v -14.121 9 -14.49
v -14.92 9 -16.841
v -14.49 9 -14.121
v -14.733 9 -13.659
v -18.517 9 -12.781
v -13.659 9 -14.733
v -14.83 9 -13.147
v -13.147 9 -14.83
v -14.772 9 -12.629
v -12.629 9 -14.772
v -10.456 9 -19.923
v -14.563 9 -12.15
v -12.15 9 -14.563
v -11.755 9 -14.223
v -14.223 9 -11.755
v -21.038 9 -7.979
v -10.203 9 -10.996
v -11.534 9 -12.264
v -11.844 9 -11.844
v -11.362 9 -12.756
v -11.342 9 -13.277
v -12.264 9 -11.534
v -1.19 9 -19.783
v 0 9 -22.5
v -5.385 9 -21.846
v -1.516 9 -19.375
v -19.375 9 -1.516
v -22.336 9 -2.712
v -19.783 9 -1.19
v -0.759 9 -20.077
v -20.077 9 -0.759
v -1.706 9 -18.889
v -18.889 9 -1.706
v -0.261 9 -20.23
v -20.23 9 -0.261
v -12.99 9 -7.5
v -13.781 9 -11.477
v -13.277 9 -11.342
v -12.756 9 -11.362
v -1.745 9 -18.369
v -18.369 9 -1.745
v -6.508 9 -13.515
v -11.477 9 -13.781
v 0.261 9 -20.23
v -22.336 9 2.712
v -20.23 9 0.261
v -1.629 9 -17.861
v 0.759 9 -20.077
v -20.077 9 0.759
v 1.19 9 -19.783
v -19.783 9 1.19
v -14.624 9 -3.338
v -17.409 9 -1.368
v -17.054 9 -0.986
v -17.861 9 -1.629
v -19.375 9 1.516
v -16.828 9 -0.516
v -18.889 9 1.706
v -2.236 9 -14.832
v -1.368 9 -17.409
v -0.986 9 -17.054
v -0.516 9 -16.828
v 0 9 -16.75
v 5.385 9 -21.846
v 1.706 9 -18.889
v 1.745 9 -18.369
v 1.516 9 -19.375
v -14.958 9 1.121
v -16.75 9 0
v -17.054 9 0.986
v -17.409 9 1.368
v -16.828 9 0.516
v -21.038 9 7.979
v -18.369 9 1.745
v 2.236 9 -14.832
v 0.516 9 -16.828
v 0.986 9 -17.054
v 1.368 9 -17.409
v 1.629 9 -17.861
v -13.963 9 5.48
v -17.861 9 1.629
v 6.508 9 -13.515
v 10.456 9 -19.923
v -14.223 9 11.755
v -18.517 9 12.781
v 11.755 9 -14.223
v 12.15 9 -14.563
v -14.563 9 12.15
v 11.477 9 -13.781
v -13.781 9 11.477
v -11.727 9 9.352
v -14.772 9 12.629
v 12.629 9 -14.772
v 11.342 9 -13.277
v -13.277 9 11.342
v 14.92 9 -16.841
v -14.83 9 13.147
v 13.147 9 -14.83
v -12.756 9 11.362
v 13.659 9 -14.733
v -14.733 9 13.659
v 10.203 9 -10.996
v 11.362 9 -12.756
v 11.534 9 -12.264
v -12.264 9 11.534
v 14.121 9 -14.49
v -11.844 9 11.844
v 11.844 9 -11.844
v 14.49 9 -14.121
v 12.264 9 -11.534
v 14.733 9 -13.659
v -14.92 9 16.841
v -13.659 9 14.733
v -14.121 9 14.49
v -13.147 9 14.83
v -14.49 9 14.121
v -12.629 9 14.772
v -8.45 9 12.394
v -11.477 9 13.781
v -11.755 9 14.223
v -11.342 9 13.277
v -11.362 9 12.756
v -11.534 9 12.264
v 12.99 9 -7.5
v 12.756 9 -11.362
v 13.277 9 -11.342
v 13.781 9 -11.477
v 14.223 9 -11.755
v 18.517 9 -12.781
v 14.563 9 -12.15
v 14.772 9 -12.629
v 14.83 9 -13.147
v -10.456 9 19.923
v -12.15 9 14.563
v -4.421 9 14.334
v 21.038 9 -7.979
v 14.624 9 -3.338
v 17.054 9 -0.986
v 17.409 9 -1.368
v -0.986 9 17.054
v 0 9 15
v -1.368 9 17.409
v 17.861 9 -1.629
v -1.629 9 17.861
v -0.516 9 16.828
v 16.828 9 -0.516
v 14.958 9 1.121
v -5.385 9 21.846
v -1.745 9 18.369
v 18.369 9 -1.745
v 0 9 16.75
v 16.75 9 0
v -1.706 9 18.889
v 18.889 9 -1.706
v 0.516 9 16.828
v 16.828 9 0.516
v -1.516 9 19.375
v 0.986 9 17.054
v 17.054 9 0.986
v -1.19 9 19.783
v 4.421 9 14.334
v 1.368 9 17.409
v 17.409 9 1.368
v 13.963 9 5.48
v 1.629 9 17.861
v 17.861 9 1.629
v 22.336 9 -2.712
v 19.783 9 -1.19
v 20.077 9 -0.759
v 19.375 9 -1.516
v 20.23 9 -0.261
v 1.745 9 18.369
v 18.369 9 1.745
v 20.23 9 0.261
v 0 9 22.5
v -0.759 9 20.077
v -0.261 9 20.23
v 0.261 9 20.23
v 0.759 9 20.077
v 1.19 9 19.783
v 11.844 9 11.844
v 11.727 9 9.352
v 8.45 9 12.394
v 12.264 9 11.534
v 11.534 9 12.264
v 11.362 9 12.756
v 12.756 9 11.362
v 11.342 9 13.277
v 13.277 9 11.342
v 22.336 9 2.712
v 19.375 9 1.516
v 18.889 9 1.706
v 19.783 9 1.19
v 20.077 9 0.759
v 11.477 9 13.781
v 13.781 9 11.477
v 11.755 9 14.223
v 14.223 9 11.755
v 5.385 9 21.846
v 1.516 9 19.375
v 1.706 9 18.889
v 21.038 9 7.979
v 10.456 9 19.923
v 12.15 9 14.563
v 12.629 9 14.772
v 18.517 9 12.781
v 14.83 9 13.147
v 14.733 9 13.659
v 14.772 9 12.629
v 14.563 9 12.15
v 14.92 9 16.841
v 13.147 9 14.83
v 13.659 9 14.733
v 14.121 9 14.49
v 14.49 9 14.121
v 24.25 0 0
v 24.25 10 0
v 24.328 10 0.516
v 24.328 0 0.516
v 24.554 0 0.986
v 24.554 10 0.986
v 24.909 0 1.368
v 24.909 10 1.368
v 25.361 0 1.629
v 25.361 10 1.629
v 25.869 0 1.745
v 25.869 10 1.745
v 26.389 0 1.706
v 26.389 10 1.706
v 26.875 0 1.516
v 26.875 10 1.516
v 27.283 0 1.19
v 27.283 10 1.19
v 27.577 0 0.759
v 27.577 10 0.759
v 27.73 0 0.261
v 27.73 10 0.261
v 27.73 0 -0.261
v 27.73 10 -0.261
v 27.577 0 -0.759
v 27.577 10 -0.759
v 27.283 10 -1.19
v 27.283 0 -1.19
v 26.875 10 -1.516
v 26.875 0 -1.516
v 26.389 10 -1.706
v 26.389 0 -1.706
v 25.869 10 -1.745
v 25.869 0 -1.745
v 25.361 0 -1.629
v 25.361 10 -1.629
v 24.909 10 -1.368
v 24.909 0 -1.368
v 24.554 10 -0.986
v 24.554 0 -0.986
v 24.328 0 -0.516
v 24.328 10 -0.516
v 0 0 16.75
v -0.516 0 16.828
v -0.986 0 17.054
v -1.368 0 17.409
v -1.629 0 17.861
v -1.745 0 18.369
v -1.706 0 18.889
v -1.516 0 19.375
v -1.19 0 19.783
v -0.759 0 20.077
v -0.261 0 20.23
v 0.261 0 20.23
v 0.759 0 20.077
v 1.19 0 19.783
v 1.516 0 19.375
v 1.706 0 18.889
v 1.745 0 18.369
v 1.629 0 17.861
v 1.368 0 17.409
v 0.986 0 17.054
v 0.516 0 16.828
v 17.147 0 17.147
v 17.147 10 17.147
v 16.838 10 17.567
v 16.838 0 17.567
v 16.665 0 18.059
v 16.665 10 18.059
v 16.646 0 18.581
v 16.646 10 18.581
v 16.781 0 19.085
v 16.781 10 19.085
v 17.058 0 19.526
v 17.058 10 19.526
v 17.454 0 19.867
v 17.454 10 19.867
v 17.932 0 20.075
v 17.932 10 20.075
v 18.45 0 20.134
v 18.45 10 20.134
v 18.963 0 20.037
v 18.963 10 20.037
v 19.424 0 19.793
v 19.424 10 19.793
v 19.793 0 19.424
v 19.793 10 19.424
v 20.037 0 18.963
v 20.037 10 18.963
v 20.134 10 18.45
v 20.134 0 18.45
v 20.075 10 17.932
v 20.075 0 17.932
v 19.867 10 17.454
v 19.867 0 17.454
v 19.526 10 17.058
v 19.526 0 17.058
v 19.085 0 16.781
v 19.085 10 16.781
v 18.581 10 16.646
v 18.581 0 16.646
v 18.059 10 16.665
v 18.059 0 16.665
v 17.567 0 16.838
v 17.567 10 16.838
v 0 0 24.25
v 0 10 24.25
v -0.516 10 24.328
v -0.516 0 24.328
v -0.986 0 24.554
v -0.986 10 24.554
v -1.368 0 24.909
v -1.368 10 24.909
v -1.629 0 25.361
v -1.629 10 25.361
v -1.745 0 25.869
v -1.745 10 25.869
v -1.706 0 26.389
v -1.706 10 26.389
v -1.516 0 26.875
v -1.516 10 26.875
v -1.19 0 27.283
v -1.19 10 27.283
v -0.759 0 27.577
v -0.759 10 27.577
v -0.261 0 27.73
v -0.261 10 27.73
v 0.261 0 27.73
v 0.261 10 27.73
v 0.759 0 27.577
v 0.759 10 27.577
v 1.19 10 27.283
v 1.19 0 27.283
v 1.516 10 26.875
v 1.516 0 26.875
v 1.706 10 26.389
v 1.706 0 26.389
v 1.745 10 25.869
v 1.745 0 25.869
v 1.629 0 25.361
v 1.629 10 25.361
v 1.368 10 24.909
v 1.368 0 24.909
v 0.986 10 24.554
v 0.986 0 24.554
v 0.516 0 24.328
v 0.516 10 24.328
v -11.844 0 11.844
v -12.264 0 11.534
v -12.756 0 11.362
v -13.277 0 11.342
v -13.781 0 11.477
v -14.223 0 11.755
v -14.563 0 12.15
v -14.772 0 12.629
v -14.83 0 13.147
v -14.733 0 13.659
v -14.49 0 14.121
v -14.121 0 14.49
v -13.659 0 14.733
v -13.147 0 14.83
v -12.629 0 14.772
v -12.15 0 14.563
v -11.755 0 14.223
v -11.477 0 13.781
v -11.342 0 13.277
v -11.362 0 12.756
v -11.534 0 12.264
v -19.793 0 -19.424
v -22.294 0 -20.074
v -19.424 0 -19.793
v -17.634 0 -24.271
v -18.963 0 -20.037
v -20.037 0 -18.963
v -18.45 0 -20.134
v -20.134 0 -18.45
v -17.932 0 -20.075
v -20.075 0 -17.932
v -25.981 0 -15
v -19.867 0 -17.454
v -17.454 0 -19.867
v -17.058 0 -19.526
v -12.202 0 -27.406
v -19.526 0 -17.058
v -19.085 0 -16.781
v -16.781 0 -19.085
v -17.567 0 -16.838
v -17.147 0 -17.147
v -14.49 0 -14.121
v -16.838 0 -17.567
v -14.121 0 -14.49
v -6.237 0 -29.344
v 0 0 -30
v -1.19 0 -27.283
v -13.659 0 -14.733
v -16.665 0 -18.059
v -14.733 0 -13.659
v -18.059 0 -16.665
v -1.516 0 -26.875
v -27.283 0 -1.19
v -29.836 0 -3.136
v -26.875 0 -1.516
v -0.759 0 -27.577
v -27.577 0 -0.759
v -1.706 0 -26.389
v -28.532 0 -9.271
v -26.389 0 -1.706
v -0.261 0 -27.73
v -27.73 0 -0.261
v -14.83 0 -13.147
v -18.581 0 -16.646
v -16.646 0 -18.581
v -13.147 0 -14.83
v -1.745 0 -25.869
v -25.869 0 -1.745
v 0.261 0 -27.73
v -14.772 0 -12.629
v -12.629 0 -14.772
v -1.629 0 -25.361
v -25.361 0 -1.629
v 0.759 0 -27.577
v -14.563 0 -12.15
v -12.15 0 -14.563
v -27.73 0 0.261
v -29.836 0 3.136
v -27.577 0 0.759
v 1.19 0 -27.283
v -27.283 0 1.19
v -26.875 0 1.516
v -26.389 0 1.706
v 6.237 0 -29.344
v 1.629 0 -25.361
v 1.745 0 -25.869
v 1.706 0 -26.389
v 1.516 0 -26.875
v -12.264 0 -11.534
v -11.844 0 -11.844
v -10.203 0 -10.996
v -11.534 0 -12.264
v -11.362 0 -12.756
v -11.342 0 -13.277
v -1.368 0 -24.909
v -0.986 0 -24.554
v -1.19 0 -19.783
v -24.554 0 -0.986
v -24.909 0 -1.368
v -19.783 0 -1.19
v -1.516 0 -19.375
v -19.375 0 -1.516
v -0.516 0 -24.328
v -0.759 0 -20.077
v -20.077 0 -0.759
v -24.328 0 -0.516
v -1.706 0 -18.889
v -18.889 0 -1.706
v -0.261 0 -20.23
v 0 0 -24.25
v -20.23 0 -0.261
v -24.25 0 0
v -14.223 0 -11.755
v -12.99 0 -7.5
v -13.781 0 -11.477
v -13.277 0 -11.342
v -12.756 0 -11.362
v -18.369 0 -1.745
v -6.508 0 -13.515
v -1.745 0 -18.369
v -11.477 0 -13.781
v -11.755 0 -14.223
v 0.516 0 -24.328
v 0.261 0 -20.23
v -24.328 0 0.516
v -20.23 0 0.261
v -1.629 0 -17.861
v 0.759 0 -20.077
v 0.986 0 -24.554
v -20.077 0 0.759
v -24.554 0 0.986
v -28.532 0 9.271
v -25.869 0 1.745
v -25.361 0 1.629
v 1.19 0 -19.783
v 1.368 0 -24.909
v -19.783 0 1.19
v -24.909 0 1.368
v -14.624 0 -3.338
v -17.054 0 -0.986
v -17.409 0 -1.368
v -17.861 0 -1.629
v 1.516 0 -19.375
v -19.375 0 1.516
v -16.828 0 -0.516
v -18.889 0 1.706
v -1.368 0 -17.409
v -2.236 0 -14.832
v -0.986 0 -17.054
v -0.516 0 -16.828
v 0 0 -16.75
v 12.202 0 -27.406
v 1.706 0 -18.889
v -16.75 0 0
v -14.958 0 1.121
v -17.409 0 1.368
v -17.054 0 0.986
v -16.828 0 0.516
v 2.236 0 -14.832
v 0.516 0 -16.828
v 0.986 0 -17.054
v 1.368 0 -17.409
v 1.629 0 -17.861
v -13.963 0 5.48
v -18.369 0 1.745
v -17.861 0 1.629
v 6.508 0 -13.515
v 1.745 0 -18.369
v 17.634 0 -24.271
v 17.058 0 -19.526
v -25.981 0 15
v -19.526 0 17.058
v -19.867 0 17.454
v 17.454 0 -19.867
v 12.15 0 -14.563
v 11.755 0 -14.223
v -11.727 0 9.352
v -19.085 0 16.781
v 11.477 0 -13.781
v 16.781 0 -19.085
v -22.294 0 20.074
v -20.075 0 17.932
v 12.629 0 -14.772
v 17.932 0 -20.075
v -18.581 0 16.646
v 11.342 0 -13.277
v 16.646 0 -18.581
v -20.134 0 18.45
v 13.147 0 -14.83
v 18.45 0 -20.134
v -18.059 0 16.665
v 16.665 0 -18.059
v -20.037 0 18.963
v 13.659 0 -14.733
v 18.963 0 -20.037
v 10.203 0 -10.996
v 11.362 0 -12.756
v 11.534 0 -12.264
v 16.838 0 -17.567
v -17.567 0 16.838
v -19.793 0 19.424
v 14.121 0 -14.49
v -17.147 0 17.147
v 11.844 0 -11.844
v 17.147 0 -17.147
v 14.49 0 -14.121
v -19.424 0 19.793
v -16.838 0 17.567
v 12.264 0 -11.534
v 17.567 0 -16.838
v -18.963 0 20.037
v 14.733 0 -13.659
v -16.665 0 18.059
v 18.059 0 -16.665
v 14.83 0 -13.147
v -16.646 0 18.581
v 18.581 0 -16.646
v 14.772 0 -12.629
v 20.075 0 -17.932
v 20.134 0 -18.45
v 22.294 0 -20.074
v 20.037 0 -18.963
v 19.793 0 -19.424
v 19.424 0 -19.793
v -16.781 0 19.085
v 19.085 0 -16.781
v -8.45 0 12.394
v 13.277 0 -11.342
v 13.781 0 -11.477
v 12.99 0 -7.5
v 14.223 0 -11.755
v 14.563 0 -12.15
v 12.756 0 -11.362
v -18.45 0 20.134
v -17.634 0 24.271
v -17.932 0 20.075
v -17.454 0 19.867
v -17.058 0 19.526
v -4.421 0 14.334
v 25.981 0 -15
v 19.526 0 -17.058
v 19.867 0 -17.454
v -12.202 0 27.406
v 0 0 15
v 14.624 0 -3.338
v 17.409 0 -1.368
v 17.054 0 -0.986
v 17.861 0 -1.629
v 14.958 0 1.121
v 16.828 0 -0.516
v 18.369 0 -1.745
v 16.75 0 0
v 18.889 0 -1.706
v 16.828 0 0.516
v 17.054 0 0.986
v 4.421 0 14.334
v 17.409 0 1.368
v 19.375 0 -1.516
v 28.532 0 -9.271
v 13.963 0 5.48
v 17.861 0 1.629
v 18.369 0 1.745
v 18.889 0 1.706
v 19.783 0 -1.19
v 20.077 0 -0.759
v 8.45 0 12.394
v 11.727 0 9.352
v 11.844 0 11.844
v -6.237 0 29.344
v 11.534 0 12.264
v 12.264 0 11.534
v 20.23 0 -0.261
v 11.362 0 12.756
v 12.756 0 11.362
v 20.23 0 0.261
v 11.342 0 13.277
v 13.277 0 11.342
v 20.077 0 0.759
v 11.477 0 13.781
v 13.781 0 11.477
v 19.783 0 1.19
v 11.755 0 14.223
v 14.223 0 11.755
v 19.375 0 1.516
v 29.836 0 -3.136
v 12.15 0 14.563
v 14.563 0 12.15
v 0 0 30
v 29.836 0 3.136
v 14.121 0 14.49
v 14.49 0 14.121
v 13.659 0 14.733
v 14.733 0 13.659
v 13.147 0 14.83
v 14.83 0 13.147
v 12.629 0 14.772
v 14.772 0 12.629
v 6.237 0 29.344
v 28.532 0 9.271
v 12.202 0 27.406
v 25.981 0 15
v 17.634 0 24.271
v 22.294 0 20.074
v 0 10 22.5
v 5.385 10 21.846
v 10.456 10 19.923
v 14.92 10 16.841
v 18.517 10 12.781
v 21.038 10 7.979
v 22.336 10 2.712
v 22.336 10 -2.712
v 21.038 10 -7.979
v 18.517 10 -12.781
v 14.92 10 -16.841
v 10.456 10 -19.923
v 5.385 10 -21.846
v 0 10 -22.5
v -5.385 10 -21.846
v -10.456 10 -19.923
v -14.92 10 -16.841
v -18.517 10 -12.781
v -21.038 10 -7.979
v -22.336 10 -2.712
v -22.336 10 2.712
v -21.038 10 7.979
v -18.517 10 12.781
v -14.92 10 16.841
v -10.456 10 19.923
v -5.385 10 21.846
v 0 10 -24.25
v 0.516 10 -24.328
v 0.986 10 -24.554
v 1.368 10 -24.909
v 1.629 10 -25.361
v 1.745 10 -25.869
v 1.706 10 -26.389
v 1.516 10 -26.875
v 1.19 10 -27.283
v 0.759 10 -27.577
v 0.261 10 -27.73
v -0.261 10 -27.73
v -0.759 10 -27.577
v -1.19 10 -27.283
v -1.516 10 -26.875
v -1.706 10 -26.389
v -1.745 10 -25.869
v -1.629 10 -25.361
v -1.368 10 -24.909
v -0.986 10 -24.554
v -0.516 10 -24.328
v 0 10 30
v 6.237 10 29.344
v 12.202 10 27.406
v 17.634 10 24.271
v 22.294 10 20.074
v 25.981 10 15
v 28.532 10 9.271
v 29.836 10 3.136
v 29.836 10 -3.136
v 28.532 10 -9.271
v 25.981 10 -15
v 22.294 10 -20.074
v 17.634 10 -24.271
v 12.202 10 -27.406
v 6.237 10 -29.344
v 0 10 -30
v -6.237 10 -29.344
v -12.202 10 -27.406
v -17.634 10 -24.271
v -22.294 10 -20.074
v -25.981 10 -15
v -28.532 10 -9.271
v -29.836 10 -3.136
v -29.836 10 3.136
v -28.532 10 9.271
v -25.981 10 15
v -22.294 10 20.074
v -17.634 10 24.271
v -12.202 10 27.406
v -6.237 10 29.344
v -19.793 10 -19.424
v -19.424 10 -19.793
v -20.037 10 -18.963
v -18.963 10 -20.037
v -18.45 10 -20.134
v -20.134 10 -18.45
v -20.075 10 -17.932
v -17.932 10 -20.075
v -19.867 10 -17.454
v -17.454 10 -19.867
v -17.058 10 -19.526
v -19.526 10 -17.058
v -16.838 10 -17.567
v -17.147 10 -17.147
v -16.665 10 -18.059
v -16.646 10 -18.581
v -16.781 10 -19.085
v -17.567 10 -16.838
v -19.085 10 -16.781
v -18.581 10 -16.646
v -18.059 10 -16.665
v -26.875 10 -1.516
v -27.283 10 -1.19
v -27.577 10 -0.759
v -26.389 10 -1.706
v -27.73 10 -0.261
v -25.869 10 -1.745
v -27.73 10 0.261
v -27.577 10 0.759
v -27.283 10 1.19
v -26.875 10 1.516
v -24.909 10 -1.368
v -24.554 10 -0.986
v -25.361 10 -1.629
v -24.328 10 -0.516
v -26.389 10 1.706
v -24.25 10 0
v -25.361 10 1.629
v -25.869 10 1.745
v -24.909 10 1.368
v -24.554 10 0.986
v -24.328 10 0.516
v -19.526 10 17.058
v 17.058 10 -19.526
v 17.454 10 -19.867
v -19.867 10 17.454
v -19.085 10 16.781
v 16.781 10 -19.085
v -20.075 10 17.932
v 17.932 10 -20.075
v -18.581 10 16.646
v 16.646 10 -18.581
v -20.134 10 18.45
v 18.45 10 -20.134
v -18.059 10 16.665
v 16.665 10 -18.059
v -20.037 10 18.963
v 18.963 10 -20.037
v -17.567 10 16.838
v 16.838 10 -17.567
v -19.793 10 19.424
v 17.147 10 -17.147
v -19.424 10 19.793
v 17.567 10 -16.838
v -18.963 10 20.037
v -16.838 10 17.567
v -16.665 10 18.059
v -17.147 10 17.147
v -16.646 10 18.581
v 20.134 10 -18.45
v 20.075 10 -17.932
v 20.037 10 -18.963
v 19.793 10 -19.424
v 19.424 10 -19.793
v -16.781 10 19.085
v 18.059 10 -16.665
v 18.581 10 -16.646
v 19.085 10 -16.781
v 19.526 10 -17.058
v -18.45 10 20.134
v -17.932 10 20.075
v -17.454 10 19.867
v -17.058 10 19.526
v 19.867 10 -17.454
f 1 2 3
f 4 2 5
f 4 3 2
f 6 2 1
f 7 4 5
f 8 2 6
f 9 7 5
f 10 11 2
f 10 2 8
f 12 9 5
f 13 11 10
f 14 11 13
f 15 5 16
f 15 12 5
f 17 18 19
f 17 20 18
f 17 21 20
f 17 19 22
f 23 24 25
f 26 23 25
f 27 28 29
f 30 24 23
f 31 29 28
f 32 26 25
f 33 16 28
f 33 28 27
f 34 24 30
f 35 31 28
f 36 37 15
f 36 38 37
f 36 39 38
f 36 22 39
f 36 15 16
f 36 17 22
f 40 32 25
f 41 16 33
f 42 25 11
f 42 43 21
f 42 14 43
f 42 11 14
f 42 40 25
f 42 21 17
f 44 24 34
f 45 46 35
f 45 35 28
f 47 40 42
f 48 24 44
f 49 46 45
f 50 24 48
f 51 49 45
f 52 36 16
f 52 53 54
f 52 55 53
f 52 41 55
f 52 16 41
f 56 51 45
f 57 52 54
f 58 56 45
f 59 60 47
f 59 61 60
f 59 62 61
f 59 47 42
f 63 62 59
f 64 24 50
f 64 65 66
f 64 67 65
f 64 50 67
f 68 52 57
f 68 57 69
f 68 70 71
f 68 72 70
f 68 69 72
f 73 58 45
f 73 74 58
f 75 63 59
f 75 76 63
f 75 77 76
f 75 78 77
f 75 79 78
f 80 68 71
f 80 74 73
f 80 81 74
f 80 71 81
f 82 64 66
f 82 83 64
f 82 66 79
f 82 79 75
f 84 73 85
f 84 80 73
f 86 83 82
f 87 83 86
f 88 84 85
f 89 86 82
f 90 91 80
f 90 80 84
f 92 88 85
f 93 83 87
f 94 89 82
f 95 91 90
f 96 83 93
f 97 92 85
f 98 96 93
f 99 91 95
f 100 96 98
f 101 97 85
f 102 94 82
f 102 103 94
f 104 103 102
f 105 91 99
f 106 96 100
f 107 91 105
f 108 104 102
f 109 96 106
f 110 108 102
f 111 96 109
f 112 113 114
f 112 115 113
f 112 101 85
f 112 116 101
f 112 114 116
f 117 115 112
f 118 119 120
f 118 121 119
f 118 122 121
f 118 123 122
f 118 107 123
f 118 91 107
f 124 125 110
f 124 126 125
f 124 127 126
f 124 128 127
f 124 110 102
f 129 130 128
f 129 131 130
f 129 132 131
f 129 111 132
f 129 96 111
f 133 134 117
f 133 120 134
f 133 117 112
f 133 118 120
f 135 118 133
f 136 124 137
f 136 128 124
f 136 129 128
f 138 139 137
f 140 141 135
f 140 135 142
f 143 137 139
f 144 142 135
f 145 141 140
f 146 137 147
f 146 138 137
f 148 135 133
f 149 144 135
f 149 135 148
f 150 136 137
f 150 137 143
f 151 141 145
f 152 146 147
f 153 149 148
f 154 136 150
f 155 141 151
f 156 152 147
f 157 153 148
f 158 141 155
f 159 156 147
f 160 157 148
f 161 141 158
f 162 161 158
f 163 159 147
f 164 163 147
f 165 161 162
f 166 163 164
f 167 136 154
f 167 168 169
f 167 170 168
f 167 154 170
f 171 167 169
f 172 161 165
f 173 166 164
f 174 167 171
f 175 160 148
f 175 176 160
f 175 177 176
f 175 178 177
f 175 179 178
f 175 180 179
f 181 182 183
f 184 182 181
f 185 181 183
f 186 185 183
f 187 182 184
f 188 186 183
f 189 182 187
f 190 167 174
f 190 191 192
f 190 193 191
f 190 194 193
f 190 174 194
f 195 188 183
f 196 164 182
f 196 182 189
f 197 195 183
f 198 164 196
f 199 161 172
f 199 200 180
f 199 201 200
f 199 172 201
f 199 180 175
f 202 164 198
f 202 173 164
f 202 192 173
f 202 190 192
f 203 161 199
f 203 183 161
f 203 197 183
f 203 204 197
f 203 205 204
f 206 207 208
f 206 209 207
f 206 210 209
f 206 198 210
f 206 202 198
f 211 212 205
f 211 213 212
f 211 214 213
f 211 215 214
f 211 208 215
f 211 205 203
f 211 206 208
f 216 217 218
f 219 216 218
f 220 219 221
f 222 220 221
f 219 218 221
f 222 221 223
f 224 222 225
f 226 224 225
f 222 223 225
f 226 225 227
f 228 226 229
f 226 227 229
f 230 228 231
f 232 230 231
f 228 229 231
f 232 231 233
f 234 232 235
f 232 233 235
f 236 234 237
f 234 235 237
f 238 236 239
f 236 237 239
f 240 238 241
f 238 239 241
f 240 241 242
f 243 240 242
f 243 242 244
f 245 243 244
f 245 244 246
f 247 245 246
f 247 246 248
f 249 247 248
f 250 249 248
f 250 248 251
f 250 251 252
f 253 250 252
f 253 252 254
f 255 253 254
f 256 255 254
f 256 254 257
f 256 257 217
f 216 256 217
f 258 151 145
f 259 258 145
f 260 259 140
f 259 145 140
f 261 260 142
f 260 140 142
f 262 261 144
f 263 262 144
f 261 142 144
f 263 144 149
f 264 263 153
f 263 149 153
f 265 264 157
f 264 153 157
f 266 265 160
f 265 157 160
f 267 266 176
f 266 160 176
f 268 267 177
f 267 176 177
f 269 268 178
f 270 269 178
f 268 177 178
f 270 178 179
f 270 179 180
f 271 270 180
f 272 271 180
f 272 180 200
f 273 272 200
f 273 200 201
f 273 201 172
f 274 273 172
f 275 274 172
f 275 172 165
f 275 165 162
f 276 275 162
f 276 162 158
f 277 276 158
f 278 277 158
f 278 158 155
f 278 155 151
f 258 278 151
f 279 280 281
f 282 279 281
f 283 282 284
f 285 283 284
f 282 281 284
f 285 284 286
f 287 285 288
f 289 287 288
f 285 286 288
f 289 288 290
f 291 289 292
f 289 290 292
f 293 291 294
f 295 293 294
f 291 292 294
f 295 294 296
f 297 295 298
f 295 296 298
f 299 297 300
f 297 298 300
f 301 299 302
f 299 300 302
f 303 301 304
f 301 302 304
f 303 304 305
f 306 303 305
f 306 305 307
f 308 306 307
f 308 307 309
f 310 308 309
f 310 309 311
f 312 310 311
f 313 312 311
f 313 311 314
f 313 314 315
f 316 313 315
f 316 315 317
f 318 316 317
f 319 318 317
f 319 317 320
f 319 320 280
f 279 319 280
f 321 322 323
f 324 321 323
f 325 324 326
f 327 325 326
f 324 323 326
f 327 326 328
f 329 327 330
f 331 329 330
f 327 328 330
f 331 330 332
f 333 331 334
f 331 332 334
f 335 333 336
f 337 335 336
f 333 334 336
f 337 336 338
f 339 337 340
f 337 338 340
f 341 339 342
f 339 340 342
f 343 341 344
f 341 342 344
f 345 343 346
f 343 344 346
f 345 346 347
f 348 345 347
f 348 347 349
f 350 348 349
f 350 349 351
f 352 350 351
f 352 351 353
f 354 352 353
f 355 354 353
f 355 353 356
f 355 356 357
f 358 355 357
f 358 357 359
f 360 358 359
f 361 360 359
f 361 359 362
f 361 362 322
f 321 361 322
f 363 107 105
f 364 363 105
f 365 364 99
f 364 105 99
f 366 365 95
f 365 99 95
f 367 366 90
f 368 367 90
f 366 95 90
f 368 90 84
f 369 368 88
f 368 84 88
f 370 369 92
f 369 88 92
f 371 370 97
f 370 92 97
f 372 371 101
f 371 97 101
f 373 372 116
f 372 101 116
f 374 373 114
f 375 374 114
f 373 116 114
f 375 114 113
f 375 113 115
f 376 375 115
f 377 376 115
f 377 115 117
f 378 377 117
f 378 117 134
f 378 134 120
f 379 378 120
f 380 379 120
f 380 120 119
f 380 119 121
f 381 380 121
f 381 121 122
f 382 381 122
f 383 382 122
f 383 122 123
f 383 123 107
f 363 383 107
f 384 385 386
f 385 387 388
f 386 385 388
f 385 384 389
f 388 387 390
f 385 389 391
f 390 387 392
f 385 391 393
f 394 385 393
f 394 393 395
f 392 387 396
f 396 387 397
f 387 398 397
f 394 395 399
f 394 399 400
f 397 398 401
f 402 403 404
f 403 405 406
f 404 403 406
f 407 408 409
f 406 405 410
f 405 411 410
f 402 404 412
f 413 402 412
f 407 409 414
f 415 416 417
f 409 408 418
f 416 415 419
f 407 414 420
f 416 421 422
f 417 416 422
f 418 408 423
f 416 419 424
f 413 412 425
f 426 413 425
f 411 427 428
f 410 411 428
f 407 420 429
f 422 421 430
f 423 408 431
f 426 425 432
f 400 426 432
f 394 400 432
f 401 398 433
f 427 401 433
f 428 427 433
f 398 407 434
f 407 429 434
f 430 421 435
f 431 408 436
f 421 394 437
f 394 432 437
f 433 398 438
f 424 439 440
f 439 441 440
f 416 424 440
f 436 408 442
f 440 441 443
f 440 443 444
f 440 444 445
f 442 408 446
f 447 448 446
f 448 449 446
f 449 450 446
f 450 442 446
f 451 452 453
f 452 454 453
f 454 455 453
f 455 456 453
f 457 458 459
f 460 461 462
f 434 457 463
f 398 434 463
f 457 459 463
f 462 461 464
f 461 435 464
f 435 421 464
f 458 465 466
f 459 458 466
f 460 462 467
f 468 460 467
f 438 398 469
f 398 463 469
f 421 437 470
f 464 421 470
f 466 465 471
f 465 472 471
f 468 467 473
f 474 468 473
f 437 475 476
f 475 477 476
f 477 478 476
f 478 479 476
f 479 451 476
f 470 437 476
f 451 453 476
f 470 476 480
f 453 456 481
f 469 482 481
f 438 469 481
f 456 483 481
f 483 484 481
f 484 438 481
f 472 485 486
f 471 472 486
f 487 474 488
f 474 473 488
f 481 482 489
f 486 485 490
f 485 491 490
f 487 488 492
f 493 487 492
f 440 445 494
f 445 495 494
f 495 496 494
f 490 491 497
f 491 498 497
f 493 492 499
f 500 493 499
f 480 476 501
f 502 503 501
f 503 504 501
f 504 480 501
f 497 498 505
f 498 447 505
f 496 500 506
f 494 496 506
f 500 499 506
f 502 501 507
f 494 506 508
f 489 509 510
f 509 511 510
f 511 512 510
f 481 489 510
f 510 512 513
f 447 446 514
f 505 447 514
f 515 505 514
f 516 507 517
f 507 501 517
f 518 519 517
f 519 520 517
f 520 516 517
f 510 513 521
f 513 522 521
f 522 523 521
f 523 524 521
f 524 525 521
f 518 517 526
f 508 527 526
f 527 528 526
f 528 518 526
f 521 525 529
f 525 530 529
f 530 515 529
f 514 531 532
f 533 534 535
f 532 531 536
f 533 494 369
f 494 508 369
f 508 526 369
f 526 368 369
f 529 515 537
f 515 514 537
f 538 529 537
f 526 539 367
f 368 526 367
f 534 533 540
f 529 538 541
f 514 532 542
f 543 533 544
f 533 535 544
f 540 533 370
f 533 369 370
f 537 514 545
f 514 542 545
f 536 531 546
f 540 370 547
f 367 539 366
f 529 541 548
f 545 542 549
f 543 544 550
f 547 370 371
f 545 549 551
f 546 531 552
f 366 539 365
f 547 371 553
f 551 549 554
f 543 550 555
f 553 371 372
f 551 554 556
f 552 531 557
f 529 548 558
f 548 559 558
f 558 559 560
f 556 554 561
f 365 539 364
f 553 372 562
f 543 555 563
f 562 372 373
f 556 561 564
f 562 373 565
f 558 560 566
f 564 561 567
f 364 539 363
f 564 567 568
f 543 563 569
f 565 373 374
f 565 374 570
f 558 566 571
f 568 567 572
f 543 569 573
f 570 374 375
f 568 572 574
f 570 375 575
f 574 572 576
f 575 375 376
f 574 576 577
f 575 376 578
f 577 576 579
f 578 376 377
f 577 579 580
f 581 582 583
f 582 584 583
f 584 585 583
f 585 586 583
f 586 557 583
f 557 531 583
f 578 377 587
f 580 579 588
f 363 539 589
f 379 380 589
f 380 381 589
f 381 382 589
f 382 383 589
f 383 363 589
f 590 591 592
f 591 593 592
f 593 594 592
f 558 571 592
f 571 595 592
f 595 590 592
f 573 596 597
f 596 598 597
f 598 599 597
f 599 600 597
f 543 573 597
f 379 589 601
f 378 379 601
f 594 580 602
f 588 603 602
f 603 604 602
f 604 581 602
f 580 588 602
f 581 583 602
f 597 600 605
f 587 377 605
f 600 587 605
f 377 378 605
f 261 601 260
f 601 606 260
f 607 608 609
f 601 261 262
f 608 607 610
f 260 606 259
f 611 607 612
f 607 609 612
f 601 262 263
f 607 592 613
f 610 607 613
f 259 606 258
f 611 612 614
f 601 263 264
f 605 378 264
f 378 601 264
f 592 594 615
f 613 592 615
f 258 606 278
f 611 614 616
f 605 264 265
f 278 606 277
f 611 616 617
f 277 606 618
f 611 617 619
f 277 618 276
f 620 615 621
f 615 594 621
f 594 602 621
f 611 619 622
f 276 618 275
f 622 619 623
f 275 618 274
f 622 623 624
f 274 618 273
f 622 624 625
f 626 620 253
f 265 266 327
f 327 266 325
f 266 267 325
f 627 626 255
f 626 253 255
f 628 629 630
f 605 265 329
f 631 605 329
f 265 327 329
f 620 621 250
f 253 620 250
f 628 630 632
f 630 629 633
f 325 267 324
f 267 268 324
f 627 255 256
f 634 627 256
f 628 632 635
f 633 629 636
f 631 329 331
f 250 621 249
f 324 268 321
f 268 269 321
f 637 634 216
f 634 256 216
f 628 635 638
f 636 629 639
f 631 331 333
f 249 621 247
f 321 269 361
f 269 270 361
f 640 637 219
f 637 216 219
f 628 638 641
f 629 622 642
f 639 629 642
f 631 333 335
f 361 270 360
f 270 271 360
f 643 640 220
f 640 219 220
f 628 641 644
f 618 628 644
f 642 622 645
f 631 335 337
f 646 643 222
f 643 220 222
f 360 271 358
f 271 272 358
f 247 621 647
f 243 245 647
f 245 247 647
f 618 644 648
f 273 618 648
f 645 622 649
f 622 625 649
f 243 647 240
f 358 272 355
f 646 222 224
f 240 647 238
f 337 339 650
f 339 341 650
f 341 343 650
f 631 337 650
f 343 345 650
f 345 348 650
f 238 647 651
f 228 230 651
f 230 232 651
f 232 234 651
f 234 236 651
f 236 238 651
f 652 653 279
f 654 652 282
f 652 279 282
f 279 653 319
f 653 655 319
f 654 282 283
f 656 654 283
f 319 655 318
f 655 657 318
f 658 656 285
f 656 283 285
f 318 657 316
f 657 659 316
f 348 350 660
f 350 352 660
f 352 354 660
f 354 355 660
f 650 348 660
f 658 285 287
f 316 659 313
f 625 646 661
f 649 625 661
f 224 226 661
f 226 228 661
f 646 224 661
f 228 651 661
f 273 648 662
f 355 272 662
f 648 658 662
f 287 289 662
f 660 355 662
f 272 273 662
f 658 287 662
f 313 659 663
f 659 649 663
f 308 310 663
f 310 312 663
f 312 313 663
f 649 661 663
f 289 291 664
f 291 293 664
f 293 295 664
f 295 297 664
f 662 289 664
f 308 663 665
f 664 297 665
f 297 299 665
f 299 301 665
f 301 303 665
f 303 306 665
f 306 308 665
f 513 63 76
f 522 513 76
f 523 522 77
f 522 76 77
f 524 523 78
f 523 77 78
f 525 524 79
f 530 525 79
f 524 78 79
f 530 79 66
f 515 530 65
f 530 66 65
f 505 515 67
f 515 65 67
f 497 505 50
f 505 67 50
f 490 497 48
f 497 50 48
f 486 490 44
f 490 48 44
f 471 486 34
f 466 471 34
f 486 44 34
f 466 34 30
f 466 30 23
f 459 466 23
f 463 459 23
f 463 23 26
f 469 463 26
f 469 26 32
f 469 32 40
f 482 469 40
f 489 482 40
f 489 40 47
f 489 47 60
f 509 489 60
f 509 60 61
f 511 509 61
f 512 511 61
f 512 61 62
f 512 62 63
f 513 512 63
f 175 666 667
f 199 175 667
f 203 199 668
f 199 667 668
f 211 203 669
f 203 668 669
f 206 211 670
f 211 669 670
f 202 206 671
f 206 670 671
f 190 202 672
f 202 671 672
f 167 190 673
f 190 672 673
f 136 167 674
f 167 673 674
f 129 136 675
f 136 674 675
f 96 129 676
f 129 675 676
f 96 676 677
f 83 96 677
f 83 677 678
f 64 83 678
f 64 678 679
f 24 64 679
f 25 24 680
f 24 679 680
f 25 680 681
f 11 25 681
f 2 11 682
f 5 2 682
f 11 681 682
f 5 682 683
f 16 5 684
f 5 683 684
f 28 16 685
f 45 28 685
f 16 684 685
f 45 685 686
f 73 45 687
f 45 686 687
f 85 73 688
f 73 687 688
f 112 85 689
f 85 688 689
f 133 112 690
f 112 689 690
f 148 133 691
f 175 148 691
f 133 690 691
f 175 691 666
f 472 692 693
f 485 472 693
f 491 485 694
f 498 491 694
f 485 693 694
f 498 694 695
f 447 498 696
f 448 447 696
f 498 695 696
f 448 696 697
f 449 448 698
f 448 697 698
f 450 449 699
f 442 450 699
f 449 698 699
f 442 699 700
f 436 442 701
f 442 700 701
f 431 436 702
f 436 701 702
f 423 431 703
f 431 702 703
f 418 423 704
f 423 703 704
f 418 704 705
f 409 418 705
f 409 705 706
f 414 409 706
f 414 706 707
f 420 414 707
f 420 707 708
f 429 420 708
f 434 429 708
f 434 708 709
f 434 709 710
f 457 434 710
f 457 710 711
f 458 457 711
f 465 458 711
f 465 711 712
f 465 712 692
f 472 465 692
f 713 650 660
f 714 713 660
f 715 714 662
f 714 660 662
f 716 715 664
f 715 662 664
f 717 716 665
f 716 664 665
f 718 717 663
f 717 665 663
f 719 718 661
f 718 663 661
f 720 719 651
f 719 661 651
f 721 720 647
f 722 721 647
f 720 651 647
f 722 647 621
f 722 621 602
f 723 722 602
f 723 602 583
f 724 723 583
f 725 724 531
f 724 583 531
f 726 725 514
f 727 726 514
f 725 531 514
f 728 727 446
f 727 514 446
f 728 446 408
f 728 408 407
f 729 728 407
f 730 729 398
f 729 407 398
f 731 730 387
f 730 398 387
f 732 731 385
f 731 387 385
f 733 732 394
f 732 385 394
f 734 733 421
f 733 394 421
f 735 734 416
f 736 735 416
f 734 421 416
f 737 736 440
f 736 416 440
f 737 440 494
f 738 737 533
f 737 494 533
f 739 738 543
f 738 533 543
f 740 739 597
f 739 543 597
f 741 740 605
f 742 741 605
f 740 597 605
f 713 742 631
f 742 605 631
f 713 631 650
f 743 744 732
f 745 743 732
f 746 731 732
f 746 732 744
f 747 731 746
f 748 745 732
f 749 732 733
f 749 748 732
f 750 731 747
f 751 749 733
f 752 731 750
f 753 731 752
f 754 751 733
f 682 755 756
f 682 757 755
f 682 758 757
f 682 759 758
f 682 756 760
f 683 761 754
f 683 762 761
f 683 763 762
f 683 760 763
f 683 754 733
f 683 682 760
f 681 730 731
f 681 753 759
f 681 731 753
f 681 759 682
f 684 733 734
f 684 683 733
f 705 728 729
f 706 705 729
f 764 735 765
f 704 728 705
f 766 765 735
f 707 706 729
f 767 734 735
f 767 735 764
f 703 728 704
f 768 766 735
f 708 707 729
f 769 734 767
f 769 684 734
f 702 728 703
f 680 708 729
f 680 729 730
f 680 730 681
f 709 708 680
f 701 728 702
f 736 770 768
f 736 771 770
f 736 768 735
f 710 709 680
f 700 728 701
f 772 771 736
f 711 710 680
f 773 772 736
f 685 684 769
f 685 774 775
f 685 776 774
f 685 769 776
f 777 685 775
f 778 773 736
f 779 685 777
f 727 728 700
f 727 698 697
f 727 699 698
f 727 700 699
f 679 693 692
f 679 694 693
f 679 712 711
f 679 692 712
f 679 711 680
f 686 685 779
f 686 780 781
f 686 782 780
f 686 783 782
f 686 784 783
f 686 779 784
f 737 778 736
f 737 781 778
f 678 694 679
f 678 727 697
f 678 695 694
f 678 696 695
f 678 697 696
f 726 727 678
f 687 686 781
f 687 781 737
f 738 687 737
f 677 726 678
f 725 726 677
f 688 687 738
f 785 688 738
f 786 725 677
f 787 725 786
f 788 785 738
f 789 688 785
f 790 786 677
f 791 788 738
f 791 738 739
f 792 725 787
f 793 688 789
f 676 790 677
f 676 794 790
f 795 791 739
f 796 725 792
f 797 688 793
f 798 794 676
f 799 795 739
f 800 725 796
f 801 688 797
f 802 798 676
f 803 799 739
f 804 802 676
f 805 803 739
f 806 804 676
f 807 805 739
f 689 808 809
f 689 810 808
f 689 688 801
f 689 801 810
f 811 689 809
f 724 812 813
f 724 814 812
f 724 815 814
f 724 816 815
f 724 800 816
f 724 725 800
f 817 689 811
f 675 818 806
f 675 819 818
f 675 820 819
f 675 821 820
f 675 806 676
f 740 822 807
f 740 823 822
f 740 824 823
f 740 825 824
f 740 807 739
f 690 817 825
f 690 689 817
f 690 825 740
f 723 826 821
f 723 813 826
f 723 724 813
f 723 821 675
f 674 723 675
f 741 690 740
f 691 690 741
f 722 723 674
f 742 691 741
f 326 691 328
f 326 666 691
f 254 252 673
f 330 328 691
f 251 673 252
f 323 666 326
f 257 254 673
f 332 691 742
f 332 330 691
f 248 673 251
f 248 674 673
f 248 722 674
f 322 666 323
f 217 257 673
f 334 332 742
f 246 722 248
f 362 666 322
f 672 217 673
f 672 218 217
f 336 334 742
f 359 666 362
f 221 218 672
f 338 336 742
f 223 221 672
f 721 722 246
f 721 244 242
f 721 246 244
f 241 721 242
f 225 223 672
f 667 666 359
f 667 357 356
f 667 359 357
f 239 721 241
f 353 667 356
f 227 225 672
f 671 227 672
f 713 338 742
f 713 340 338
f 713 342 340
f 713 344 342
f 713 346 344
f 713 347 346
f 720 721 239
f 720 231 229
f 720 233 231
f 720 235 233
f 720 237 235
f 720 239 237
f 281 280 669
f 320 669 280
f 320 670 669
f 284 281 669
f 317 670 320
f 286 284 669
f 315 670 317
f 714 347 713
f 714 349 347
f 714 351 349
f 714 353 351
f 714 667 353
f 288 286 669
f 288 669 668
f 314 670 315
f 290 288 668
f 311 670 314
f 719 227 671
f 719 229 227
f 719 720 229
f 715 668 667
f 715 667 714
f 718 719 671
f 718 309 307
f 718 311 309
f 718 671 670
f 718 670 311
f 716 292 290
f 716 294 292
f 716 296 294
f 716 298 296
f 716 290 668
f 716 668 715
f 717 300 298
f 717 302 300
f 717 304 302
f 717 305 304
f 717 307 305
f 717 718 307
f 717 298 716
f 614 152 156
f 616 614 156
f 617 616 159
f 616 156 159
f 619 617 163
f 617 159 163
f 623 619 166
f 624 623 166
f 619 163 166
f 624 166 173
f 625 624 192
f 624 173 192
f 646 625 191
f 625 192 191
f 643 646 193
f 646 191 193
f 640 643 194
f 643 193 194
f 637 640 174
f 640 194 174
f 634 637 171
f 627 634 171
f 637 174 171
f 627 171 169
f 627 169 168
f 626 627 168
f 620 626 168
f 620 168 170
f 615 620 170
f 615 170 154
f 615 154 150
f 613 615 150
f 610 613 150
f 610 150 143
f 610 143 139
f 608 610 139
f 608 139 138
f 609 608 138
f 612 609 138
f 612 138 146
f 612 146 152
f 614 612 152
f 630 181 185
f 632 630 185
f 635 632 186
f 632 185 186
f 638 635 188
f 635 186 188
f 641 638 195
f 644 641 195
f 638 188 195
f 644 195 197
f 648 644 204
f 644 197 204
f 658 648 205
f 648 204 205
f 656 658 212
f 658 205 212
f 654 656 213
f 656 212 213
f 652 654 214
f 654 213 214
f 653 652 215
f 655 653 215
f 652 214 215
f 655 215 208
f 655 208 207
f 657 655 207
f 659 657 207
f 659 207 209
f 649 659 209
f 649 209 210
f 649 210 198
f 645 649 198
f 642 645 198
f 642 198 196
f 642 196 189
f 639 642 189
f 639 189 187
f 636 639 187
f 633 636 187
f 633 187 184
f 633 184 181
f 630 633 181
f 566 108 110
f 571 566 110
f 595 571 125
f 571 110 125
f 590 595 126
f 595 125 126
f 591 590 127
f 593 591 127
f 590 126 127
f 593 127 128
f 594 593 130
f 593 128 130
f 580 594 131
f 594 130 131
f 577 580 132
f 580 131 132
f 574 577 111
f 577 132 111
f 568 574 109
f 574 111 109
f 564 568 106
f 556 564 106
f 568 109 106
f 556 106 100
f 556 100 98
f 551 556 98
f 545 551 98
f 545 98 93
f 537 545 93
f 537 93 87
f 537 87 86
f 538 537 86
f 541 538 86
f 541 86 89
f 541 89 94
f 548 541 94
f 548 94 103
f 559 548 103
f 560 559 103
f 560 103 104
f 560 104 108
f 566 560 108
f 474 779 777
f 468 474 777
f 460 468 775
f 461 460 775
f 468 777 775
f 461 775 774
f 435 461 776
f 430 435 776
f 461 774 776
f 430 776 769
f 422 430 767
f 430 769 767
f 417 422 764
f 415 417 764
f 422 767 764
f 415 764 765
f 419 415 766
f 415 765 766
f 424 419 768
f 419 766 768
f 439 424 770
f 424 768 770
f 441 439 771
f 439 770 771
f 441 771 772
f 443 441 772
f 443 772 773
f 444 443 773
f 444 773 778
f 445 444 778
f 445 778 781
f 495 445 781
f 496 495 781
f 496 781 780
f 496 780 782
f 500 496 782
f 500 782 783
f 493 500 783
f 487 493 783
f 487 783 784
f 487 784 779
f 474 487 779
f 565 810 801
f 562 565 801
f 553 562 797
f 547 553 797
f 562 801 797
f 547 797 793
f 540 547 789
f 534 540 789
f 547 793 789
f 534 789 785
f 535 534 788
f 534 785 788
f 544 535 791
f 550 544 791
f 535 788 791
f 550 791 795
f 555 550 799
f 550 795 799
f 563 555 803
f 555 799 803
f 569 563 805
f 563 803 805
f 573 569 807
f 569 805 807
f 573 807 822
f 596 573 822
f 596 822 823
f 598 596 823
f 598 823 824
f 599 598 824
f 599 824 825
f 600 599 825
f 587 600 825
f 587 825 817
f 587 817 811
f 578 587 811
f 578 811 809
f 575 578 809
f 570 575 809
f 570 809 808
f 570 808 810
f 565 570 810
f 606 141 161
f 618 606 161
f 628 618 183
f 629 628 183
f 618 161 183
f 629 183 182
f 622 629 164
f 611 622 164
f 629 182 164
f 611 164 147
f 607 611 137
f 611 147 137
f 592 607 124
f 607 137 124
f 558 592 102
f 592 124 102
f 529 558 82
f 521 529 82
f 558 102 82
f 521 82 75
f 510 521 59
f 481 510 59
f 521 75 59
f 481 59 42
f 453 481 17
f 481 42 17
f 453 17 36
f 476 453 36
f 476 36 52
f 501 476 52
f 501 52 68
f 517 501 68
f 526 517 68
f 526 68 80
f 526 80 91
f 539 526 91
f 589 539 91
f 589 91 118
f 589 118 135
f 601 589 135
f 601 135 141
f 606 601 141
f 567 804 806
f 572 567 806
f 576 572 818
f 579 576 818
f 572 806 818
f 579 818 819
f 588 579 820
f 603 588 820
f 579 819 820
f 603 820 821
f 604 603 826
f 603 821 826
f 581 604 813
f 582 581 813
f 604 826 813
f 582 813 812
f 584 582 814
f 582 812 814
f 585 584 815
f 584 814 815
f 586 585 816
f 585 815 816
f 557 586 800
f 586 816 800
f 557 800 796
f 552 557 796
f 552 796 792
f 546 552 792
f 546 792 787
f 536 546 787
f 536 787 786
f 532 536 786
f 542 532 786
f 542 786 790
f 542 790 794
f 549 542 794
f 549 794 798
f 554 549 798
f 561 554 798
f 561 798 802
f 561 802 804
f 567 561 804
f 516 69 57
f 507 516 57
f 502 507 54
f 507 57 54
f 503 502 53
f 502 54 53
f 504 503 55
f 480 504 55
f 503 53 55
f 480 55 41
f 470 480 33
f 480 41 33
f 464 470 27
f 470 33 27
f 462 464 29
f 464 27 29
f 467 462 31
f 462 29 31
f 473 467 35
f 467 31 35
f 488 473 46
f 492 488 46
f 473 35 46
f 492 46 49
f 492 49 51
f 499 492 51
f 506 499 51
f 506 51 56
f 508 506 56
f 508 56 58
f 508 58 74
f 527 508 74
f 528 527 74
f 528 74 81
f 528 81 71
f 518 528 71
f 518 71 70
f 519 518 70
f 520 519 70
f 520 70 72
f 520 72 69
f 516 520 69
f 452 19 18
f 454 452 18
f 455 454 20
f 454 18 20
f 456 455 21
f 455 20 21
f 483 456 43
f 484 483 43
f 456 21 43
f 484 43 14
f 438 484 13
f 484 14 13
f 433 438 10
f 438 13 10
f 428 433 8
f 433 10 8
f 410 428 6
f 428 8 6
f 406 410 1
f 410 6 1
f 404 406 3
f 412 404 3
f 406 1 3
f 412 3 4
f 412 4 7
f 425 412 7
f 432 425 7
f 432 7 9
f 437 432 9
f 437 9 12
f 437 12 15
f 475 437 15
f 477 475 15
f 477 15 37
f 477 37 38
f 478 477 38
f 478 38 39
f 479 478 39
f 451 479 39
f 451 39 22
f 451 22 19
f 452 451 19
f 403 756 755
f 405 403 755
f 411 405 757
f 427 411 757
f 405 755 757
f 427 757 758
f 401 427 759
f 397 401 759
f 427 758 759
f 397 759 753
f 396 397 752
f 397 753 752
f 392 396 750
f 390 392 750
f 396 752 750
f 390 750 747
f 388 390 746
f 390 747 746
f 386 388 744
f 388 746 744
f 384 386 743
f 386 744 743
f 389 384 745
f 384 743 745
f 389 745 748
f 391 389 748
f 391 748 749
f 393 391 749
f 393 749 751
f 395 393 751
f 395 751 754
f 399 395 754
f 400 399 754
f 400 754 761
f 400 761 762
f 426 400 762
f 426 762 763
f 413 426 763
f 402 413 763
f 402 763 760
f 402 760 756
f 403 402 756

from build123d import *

# Parameters (mm, degrees)
SKETCH1_R           = 30
BOSS_EXTRUDE1_DEPTH = 10
SKETCH2_R           = 15
CUT_EXTRUDE1_DEPTH  = 44.588989435
SKETCH3_R           = 22.5
CUT_EXTRUDE2_DEPTH  = 1
SKETCH4_R           = 1.75
CUT_EXTRUDE3_DEPTH  = 44.370496884
CIRPATTERN1_COUNT   = 8
SKETCH5_R           = 1.75
CUT_EXTRUDE4_DEPTH  = 44.588989435
CIRPATTERN2_COUNT   = 8


with BuildPart() as part:
    # Sketch1 → Boss-Extrude1 (new body)
    with BuildSketch(Plane(origin=(0, 0, 0), x_dir=(1, 0, 0), z_dir=(0, 1, 0))):
        with Locations(Location((0, 0, 0), (0, 0, 270))):
            Circle(SKETCH1_R)
    extrude(amount=BOSS_EXTRUDE1_DEPTH)

    # Sketch2 → Cut-Extrude1 (cut, through all)
    with BuildSketch(Plane(origin=(0, 10, 0), x_dir=(1, 0, 0), z_dir=(0, 1, 0))):
        with Locations(Location((0, 0, 0), (0, 0, 270))):
            Circle(SKETCH2_R)
    extrude(amount=-CUT_EXTRUDE1_DEPTH, mode=Mode.SUBTRACT)

    # Sketch3 → Cut-Extrude2 (cut)
    with BuildSketch(Plane(origin=(0, 10, 0), x_dir=(1, 0, 0), z_dir=(0, 1, 0))):
        with Locations(Location((0, 0, 0), (0, 0, 270))):
            Circle(SKETCH3_R)
    extrude(amount=-CUT_EXTRUDE2_DEPTH, mode=Mode.SUBTRACT)

    # Sketch4 → Cut-Extrude3 (cut, through all)
    with BuildSketch(Plane(origin=(0, 9, 0), x_dir=(1, 0, 0), z_dir=(0, 1, 0))):
        with Locations(Location((0, 18.5, 0), (0, 0, 270))):
            Circle(SKETCH4_R)
    cut_extrude3 = extrude(amount=-CUT_EXTRUDE3_DEPTH, mode=Mode.SUBTRACT)

    # CirPattern1: Cut-Extrude3 ×8 about axis
    cirpattern1_axis = Axis((0, 0, 0), (0, 1, 0))
    for i in range(1, CIRPATTERN1_COUNT):
        add(cut_extrude3.rotate(cirpattern1_axis, i * 360 / CIRPATTERN1_COUNT), mode=Mode.SUBTRACT)

    # Sketch5 → Cut-Extrude4 (cut, through all)
    with BuildSketch(Plane(origin=(0, 10, 0), x_dir=(1, 0, 0), z_dir=(0, 1, 0))):
        with Locations(Location((0, 26, 0), (0, 0, 270))):
            Circle(SKETCH5_R)
    cut_extrude4 = extrude(amount=-CUT_EXTRUDE4_DEPTH, mode=Mode.SUBTRACT)

    # CirPattern2: Cut-Extrude4 ×8 about axis
    cirpattern2_axis = Axis((0, 0, 0), (0, 1, 0))
    for i in range(1, CIRPATTERN2_COUNT):
        add(cut_extrude4.rotate(cirpattern2_axis, i * 360 / CIRPATTERN2_COUNT), mode=Mode.SUBTRACT)


solid = part.part
